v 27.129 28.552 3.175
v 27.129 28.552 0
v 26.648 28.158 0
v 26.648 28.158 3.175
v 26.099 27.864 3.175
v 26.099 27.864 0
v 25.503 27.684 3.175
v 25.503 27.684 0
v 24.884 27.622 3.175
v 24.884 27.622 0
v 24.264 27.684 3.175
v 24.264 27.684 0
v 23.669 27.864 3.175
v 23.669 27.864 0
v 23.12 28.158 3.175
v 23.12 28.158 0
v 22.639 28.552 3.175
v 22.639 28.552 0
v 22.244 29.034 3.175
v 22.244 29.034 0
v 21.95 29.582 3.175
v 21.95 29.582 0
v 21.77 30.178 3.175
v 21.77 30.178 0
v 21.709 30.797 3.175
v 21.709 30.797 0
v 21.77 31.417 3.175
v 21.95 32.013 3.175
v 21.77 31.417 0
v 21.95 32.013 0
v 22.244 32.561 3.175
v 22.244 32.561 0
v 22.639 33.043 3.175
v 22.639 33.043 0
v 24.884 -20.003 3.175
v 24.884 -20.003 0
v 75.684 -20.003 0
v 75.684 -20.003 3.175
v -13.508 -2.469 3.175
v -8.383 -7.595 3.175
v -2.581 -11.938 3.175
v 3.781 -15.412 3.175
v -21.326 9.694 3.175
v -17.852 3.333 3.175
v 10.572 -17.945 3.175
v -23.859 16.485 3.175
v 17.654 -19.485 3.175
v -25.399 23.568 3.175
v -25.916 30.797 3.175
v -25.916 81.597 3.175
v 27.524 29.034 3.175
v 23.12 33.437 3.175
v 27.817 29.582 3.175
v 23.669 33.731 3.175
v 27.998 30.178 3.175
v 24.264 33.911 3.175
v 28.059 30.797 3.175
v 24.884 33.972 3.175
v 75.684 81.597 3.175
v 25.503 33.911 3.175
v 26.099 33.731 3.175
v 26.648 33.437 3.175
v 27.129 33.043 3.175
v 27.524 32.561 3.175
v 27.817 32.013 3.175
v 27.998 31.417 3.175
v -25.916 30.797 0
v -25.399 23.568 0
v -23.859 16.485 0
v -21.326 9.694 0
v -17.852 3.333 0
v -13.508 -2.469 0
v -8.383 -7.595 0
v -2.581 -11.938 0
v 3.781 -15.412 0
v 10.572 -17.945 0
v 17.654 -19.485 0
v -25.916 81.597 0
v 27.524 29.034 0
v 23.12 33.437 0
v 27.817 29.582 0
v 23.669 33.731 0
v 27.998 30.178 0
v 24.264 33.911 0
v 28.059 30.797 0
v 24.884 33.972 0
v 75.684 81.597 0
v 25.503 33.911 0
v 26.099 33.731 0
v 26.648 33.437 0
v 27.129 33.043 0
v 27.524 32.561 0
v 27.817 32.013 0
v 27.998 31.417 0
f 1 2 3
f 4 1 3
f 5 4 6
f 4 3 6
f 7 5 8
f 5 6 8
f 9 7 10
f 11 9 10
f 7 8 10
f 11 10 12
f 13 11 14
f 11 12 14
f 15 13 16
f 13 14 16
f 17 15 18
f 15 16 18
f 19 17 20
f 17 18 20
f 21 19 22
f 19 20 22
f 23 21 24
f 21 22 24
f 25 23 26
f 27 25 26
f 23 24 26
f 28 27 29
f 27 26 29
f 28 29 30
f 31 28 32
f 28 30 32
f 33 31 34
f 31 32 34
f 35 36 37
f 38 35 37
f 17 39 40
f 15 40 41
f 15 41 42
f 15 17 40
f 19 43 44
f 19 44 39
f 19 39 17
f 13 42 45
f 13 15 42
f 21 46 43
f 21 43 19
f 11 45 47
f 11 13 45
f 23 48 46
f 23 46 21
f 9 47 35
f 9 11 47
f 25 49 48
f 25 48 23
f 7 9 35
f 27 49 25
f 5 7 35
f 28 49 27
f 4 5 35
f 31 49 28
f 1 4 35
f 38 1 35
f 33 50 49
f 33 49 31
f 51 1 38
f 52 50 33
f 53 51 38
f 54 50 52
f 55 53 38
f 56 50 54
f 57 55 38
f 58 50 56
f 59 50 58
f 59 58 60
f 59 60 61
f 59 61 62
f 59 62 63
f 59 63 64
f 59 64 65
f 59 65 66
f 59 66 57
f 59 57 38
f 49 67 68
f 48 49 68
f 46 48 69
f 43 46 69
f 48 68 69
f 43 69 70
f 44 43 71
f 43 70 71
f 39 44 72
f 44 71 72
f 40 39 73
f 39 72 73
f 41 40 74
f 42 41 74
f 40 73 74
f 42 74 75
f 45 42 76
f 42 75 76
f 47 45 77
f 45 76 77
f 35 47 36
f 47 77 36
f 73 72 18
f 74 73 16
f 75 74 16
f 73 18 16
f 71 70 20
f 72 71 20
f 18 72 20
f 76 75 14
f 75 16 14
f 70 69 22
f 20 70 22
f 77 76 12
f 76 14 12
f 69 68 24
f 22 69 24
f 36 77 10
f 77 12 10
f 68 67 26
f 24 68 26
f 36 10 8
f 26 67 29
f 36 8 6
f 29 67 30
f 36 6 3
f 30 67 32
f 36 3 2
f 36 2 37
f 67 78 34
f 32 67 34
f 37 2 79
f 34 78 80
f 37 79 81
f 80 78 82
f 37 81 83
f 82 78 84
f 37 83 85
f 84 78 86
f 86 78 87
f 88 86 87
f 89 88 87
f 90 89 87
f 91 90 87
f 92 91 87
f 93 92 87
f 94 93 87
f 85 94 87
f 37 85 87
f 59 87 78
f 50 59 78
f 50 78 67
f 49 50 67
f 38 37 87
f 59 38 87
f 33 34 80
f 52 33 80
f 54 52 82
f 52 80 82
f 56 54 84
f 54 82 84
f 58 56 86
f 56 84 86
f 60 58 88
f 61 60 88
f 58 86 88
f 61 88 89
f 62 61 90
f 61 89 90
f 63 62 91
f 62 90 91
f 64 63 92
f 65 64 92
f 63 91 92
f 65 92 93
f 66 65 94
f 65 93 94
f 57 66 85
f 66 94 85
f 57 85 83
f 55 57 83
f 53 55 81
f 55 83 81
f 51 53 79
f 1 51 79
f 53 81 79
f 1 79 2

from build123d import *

# Parameters (mm, degrees)
F1_DEPTH = 3.175


with BuildPart() as f1:
    # F0 (on Top) → F1 (new body)
    with BuildSketch(Plane.XY):
        with BuildLine():
            Line((-25.9162820876, 81.5974989146), (-25.9162820876, 30.7974989146))
            ThreePointArc((-25.9162820876, 30.7974989146), (-22.0493623391, 50.2378172787), (-11.0373065718, 66.7185233989))
            Line((-11.0373065718, 66.7185233989), (-25.9162820876, 81.5974989146))
        make_face()
        with BuildLine():
            ThreePointArc((-25.9162820876, 30.7974989146), (-11.0373065718, -5.1235255697), (24.8837179124, -20.0025010854))
            ThreePointArc((24.8837179124, -20.0025010854), (44.3240362766, -16.135581337), (60.8047423967, -5.1235255697))
            Line((60.8047423967, -5.1235255697), (27.1287819427, 28.5524348843))
            ThreePointArc((27.1287819427, 28.5524348843), (22.6386538822, 28.5524348843), (22.6386538822, 33.0425629449))
            Line((22.6386538822, 33.0425629449), (-11.0373065718, 66.7185233989))
            ThreePointArc((-11.0373065718, 66.7185233989), (-22.0493623391, 50.2378172787), (-25.9162820876, 30.7974989146))
        make_face()
        with BuildLine():
            ThreePointArc((60.8047423967, -5.1235255697), (44.3240362766, -16.135581337), (24.8837179124, -20.0025010854))
            Line((24.8837179124, -20.0025010854), (75.6837179124, -20.0025010854))
            Line((75.6837179124, -20.0025010854), (60.8047423967, -5.1235255697))
        make_face()
        with BuildLine():
            Line((60.8047423967, -5.1235255697), (75.6837179124, -20.0025010854))
            Line((75.6837179124, -20.0025010854), (75.6837179124, 30.7974989146))
            ThreePointArc((75.6837179124, 30.7974989146), (71.816798164, 11.3571805505), (60.8047423967, -5.1235255697))
        make_face()
        with BuildLine():
            Line((27.1287819427, 28.5524348843), (60.8047423967, -5.1235255697))
            ThreePointArc((60.8047423967, -5.1235255697), (71.816798164, 11.3571805505), (75.6837179124, 30.7974989146))
            ThreePointArc((75.6837179124, 30.7974989146), (60.8047423967, 66.7185233989), (24.8837179124, 81.5974989146))
            ThreePointArc((24.8837179124, 81.5974989146), (5.4433995483, 77.7305791662), (-11.0373065718, 66.7185233989))
            Line((-11.0373065718, 66.7185233989), (22.6386538822, 33.0425629449))
            ThreePointArc((22.6386538822, 33.0425629449), (26.0987378102, 33.7308164303), (28.0587179124, 30.7974989146))
            ThreePointArc((28.0587179124, 30.7974989146), (27.8170354282, 29.5824790168), (27.1287819427, 28.5524348843))
        make_face()
        with BuildLine():
            Line((24.8837179124, 81.5974989146), (-25.9162820876, 81.5974989146))
            Line((-25.9162820876, 81.5974989146), (-11.0373065718, 66.7185233989))
            ThreePointArc((-11.0373065718, 66.7185233989), (5.4433995483, 77.7305791662), (24.8837179124, 81.5974989146))
        make_face()
        with BuildLine():
            ThreePointArc((24.8837179124, 81.5974989146), (60.8047423967, 66.7185233989), (75.6837179124, 30.7974989146))
            Line((75.6837179124, 30.7974989146), (75.6837179124, 81.5974989146))
            Line((75.6837179124, 81.5974989146), (24.8837179124, 81.5974989146))
        make_face()
    extrude(amount=F1_DEPTH)


solid = f1.part
